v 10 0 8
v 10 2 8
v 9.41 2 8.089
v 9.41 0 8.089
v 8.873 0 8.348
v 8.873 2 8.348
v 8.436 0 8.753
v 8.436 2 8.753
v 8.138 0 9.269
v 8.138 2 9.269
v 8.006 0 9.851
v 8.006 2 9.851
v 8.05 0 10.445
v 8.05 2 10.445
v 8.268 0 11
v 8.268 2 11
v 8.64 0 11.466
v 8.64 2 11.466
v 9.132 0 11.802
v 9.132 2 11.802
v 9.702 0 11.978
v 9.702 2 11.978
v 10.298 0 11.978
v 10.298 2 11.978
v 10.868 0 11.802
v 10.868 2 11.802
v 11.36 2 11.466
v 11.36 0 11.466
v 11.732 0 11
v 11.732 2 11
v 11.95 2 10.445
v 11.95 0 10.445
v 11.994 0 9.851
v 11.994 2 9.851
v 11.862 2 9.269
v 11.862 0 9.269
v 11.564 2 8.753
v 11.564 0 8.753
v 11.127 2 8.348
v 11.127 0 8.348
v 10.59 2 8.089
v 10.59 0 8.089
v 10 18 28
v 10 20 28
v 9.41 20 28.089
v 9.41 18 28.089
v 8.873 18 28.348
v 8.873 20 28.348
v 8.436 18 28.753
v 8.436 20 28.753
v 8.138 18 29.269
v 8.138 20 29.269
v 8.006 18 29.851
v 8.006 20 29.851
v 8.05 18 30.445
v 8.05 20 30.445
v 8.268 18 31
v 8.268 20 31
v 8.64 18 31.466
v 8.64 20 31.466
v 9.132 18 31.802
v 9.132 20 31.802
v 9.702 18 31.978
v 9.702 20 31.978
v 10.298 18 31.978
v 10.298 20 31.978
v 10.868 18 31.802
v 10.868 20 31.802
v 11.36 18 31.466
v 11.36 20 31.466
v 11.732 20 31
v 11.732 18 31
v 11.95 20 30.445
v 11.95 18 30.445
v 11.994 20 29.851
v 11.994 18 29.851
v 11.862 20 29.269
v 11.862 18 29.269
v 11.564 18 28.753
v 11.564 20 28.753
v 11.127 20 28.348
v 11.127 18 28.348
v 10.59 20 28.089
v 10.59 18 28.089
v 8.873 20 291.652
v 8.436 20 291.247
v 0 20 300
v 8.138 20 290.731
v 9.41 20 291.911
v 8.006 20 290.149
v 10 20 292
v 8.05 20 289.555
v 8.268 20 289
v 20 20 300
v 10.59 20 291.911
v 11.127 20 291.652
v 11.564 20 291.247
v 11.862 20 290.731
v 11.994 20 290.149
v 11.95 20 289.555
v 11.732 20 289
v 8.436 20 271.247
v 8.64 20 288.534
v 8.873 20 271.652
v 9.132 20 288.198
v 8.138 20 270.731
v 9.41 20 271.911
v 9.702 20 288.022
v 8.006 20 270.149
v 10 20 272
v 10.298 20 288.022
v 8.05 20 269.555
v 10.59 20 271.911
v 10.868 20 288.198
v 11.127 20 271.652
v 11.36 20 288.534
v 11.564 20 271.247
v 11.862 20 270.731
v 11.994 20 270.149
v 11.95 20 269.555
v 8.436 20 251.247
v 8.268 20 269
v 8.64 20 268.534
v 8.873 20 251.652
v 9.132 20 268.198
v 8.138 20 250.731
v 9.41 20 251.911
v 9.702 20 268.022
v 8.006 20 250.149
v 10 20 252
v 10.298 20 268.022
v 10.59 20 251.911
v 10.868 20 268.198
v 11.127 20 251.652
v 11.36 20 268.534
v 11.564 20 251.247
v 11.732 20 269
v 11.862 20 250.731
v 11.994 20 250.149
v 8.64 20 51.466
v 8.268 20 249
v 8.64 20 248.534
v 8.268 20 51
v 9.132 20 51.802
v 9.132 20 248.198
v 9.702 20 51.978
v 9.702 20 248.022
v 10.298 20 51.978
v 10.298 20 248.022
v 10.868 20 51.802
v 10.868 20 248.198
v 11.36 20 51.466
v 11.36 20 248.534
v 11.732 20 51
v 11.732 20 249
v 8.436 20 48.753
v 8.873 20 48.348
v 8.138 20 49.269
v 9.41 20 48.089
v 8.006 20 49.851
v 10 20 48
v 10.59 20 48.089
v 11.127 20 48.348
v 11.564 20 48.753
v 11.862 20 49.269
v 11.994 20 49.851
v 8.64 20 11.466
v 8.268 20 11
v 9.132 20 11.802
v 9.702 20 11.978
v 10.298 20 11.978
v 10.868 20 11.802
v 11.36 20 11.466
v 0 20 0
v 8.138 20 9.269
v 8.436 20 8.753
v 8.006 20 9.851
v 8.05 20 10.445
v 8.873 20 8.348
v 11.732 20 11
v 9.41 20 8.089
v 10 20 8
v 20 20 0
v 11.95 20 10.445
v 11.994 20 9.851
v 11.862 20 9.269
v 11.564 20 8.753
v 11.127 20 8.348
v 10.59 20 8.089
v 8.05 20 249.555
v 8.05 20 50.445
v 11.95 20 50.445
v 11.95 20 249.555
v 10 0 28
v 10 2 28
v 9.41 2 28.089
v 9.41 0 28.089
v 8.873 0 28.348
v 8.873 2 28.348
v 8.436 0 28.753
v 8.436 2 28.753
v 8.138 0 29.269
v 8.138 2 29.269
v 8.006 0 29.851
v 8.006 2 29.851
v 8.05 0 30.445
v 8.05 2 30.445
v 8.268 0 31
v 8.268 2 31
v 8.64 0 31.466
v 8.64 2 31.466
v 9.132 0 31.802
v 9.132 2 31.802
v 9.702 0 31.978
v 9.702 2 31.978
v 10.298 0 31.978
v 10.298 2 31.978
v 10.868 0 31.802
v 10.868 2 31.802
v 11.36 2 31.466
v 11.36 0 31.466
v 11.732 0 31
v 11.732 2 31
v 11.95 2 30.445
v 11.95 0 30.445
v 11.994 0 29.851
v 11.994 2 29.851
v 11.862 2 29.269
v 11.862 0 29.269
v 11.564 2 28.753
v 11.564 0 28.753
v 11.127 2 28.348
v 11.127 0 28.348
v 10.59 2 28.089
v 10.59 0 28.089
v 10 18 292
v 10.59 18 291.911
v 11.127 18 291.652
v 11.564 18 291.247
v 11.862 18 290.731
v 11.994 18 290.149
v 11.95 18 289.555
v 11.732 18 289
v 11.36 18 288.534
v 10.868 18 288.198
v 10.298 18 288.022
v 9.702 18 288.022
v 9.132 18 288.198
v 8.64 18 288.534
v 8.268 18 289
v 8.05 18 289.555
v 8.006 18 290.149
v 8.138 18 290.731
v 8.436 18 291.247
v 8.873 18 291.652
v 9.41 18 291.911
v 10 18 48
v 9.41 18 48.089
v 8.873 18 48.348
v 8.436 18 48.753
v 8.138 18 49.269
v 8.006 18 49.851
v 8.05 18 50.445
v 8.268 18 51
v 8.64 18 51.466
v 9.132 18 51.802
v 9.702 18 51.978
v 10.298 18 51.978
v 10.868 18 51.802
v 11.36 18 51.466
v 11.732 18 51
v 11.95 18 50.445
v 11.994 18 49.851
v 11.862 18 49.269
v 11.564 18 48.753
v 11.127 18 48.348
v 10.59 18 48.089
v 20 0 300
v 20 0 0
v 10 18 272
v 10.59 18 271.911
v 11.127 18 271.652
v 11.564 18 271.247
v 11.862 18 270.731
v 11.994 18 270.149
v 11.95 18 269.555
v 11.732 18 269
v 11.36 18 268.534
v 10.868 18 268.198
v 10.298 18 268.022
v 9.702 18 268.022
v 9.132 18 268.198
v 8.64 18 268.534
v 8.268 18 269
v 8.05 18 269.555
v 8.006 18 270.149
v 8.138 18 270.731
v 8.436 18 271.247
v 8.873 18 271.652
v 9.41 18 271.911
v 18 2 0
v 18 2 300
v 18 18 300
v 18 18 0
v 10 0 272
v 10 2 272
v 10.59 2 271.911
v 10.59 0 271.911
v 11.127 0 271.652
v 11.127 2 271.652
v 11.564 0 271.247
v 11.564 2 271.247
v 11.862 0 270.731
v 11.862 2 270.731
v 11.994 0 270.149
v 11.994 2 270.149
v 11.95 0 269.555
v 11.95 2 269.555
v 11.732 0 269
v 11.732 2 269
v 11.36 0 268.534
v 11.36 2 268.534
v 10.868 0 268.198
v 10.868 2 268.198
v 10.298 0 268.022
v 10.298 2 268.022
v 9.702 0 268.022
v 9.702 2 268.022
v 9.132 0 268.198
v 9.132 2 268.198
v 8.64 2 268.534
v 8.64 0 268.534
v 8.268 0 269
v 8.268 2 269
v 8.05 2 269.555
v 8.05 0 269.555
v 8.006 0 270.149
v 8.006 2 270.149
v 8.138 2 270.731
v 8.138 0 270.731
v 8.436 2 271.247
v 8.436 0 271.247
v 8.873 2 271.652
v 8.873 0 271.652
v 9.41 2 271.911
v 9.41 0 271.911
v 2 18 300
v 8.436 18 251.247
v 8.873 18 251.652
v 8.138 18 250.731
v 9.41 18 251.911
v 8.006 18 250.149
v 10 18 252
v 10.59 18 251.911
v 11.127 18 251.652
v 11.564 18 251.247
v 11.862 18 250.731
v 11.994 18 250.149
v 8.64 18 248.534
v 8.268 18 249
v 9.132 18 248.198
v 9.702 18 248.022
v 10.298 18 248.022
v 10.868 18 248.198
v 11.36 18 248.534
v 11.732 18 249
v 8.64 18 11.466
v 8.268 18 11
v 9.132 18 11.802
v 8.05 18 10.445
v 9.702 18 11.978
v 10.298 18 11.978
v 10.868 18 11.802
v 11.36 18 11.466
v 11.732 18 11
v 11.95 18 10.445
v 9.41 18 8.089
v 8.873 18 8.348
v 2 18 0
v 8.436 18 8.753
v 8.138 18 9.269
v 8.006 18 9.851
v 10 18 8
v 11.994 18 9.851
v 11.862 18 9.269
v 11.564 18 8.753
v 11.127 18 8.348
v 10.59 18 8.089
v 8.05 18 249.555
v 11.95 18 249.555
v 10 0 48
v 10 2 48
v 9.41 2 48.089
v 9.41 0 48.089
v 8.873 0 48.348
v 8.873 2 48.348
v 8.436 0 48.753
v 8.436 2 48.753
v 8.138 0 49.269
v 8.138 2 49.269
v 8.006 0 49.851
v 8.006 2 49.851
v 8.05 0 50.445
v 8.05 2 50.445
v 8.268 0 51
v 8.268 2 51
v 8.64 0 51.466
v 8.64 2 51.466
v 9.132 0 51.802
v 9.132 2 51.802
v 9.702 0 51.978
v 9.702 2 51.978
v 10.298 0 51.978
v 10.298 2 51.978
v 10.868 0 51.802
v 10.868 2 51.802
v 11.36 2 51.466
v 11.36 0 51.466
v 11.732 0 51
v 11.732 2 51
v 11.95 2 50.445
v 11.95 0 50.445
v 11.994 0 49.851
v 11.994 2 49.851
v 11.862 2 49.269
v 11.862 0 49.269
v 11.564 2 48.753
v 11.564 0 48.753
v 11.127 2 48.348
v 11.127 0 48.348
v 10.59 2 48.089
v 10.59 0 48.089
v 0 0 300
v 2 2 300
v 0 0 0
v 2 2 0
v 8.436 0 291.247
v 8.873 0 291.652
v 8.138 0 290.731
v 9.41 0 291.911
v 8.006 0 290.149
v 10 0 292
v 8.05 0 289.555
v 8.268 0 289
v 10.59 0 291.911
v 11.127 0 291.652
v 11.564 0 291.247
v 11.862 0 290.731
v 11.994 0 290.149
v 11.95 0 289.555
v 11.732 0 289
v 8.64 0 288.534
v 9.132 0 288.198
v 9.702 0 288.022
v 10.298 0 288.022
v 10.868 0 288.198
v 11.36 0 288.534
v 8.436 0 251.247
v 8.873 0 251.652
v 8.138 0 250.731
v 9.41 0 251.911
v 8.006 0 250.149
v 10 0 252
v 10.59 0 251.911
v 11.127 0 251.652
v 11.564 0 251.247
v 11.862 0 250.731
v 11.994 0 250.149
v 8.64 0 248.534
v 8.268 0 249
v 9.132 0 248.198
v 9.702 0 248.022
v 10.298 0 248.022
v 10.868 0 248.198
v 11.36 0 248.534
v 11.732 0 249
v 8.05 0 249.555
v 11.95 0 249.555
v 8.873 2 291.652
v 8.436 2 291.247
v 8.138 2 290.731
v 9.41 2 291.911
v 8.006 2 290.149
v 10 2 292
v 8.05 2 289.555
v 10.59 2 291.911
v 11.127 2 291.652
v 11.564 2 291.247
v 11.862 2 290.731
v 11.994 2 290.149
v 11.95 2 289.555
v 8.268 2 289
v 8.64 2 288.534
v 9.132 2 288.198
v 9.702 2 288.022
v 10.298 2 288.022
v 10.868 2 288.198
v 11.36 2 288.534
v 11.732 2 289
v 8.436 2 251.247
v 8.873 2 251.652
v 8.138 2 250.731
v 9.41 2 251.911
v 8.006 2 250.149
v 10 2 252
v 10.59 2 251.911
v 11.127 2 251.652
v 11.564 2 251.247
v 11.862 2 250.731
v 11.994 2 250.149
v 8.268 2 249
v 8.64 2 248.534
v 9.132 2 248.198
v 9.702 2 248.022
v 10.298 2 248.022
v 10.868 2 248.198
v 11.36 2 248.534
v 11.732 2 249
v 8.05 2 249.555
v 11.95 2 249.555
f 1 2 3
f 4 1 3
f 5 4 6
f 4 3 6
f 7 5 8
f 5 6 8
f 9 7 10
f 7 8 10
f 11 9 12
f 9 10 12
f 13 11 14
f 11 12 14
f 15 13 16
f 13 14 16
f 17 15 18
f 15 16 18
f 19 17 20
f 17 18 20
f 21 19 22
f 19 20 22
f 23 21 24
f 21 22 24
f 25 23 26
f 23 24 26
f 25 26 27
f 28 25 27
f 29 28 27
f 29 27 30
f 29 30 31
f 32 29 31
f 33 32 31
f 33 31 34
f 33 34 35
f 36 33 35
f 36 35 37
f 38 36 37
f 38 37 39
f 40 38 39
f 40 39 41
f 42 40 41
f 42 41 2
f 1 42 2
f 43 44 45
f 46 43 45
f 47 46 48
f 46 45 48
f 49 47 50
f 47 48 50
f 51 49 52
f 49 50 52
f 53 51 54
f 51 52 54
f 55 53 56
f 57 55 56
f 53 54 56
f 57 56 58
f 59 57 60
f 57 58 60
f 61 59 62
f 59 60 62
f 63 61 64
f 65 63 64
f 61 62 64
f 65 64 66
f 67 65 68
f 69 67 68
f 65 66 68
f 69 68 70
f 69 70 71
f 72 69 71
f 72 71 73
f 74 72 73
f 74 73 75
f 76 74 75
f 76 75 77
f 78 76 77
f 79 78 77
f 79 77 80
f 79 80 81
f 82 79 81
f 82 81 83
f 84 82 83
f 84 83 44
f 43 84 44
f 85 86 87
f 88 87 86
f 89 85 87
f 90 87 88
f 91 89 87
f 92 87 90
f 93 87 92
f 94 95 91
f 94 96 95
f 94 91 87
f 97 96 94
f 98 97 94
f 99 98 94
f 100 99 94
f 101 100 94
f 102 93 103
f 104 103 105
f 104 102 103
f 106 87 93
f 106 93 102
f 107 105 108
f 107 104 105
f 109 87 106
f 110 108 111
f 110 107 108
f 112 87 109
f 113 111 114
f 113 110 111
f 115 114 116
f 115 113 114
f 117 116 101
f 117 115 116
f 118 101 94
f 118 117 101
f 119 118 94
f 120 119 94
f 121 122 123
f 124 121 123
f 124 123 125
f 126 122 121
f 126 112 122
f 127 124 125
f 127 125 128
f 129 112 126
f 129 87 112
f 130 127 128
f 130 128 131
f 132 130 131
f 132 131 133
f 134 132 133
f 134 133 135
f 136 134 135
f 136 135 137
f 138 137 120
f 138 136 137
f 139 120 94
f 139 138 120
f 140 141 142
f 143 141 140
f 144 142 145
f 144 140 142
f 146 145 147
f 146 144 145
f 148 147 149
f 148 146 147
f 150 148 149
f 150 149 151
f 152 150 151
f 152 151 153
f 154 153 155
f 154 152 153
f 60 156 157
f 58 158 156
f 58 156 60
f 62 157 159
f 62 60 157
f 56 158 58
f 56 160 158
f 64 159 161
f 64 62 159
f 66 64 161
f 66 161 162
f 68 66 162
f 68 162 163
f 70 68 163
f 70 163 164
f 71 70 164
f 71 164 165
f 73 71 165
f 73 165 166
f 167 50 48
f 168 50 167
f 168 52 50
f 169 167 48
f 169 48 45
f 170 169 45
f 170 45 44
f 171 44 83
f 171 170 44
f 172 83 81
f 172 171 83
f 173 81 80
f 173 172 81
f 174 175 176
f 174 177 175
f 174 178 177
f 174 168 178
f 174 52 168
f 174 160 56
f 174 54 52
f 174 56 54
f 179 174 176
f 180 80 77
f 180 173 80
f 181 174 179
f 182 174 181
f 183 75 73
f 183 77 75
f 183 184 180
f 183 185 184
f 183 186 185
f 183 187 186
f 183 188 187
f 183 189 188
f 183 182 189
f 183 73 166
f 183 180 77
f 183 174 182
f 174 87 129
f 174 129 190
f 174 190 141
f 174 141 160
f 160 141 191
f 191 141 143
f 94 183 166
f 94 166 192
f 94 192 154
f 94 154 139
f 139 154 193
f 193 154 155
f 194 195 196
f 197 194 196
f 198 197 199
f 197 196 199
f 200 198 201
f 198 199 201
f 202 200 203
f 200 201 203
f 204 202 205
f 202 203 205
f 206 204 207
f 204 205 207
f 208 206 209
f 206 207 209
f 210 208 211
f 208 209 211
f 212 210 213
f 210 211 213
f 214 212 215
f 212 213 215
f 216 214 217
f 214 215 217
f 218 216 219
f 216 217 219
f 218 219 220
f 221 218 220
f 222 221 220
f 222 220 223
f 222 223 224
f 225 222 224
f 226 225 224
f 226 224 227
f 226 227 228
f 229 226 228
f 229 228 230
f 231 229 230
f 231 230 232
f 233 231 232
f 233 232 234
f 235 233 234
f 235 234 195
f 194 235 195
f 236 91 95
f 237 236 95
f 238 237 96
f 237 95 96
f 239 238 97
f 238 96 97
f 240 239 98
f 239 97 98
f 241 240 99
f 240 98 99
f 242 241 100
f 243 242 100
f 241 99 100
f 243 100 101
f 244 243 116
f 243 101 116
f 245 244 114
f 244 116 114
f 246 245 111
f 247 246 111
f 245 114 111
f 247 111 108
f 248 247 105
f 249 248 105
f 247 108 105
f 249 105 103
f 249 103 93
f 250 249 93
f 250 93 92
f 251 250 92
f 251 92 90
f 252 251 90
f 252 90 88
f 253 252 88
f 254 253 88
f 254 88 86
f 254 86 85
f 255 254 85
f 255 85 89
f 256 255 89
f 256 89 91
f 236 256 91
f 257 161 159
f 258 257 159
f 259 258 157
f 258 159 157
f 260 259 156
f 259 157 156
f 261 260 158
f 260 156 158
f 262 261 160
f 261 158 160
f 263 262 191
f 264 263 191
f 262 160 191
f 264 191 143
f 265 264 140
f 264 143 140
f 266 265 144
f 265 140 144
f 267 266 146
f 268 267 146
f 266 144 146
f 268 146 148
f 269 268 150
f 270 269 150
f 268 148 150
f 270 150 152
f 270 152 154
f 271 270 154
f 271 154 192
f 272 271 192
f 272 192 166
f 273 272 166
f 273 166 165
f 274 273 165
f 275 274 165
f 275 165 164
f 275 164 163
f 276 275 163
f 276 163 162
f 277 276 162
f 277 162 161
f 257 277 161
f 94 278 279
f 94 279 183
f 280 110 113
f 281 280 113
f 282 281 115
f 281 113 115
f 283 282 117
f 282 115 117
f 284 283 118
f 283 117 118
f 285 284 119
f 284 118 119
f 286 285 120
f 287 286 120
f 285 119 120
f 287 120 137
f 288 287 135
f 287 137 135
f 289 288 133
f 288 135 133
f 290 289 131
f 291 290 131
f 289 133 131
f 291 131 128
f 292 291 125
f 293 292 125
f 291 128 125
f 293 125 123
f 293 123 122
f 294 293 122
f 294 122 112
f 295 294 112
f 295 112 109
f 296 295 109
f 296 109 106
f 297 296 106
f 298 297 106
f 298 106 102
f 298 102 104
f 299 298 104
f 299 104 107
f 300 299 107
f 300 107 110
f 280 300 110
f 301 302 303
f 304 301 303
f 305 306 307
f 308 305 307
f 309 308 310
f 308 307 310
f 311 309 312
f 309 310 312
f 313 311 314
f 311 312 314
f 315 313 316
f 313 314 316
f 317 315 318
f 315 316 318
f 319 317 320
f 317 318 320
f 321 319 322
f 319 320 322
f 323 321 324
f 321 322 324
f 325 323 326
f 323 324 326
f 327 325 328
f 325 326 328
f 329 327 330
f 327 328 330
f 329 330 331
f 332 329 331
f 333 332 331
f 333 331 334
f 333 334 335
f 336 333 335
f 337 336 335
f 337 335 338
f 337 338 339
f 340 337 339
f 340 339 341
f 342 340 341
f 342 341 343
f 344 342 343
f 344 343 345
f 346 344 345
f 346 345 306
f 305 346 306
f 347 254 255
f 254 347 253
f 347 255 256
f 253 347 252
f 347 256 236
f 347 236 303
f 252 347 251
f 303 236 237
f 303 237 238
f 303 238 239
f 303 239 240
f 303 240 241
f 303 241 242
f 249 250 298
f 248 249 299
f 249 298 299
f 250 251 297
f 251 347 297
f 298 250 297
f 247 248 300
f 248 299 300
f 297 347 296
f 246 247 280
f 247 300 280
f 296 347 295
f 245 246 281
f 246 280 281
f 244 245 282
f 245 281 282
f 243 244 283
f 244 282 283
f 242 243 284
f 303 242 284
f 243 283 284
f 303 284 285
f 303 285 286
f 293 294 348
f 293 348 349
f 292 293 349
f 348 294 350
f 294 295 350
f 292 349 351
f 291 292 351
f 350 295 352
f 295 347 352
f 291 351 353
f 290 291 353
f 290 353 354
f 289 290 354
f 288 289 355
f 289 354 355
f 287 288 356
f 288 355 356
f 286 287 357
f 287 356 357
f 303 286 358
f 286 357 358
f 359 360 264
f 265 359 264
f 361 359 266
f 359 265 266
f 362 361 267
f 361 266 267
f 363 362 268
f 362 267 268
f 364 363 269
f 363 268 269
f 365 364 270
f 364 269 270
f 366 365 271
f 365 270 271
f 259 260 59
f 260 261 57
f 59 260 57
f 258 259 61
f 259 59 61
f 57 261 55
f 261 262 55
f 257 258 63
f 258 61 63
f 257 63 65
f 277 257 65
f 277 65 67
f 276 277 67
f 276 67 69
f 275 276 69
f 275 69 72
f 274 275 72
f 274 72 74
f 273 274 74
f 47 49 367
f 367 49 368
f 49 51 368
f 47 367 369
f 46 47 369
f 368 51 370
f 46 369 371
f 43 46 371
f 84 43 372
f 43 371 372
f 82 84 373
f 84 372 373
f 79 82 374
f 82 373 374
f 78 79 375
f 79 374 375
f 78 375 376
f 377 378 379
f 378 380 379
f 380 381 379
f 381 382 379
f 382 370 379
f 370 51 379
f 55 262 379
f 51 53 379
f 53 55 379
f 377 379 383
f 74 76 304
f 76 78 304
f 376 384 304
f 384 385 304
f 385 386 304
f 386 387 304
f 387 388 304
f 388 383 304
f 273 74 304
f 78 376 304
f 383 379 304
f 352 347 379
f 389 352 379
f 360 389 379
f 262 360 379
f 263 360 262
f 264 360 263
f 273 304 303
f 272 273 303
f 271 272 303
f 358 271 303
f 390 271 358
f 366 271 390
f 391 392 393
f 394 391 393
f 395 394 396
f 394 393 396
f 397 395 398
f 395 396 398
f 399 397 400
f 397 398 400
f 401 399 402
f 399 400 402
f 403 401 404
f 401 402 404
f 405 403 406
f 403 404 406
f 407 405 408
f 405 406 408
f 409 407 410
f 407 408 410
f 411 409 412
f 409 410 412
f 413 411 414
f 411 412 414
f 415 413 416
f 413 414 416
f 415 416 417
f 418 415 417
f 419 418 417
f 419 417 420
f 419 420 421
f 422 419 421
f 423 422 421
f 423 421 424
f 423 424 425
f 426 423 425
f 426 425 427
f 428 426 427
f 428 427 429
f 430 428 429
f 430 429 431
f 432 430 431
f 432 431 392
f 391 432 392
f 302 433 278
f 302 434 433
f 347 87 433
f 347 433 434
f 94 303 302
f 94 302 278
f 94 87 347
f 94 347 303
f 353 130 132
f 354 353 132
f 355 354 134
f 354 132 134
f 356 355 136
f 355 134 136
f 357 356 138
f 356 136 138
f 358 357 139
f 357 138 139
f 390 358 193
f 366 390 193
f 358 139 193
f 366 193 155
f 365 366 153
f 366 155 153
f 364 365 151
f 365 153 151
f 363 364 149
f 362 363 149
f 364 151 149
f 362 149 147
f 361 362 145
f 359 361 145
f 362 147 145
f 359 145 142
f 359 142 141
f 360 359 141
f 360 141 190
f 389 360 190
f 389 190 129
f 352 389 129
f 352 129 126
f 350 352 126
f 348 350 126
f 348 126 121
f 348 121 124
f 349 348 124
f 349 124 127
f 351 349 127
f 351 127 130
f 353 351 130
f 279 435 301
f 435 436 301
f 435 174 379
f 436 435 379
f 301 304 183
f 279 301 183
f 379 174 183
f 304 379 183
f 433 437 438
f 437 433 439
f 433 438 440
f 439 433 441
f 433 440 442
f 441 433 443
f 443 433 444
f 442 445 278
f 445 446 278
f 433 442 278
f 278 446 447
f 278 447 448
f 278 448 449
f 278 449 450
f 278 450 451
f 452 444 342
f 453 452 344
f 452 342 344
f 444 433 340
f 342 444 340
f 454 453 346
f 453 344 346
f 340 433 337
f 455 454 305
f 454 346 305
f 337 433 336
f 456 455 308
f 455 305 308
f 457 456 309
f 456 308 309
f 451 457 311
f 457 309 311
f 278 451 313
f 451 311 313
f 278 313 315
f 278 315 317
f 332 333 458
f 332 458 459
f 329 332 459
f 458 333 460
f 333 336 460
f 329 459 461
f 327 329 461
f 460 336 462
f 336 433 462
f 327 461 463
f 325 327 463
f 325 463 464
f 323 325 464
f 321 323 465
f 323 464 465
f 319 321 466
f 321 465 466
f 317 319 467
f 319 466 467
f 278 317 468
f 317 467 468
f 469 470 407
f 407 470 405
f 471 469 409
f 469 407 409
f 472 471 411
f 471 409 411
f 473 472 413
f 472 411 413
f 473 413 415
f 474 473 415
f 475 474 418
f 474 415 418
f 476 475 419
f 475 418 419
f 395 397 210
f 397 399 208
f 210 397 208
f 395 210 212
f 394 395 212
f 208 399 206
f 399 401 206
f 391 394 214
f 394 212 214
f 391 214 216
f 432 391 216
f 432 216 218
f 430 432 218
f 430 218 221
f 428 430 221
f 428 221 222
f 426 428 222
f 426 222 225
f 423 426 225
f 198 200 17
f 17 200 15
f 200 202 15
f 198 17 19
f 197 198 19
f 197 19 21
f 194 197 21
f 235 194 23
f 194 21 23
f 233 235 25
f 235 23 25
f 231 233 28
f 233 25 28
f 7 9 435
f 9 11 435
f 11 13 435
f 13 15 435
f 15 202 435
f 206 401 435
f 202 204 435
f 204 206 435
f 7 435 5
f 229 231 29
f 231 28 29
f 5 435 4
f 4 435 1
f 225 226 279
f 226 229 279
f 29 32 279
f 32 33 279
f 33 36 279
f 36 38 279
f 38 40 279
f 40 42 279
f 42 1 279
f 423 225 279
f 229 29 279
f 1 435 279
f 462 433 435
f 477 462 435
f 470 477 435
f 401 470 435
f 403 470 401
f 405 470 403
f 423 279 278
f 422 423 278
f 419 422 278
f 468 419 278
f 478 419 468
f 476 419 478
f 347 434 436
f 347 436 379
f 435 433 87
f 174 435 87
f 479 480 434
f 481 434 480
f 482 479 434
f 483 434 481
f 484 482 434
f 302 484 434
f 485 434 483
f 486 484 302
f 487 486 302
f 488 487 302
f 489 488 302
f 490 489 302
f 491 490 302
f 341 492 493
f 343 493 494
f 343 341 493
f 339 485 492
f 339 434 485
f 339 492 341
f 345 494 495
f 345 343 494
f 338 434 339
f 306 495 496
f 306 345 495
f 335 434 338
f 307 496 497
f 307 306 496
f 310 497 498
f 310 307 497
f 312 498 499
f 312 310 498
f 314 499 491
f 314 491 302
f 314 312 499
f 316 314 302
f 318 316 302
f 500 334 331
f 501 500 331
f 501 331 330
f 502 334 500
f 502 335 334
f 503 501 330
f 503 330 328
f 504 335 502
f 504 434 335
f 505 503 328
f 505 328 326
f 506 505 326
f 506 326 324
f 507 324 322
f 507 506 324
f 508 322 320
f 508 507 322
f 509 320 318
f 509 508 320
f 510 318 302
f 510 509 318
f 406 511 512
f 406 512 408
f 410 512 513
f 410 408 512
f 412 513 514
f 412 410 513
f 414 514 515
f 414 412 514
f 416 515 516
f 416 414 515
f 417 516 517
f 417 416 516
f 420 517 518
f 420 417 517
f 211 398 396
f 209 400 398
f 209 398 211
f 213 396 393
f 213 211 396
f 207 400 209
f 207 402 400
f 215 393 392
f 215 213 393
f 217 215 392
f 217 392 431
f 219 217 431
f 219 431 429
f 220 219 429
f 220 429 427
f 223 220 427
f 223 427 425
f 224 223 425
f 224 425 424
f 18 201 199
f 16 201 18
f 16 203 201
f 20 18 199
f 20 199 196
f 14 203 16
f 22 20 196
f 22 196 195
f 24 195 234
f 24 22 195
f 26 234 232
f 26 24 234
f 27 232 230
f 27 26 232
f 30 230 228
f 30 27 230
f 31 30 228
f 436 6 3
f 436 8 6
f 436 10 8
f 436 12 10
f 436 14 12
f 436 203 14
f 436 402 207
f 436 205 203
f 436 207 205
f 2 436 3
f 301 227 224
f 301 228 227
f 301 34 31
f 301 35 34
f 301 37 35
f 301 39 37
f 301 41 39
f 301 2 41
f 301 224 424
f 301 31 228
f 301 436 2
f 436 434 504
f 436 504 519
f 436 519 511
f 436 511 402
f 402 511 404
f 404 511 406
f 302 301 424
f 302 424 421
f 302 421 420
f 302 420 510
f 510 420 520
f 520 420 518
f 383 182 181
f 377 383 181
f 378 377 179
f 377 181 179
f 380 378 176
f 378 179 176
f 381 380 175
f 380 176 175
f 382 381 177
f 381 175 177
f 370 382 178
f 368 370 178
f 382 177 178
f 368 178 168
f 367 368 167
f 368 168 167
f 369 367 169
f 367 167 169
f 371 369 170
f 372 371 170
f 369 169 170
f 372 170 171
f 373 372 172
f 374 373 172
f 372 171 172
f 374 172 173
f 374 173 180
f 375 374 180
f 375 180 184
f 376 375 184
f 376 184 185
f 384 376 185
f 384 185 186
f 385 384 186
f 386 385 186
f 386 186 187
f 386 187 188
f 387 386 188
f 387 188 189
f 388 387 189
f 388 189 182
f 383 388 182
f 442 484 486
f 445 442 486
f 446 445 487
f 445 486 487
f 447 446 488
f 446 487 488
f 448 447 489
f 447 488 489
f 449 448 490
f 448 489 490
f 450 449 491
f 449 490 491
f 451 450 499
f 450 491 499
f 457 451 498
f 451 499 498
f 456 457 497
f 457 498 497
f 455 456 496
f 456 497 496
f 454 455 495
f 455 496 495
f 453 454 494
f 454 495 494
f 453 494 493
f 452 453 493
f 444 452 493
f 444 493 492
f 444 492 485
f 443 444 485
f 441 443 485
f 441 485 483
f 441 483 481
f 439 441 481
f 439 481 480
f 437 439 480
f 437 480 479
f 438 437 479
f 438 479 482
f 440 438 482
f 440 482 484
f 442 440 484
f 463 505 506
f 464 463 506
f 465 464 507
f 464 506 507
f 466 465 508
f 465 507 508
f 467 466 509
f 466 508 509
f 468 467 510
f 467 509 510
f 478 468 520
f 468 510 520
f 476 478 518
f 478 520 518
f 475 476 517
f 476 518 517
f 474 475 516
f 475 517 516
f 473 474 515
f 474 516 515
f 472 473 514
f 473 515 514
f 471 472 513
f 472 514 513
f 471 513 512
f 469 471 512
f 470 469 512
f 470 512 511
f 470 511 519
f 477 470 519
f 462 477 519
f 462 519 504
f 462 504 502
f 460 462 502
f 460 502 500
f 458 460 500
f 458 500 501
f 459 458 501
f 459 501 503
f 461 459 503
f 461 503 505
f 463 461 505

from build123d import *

# Parameters (mm, degrees)
SKETCH_1_W          = 20
SKETCH_1_H          = 20
SKETCH_1_W_2        = 16
SKETCH_1_H_2        = 16
EXTRUDE_1_DEPTH     = 300
SKETCH_2_R          = 2
CUT_EXTRUDE_1_DEPTH = 302.330383466


with BuildPart() as part:
    # 草图1 → 拉伸-薄壁1 (new body)
    with BuildSketch(Plane.XY):
        with Locations((10, 10)):
            Rectangle(SKETCH_1_W, SKETCH_1_H)
        with Locations((10, 10)):
            Rectangle(SKETCH_1_W_2, SKETCH_1_H_2, mode=Mode.SUBTRACT)
    extrude(amount=EXTRUDE_1_DEPTH)

    # 草图2 → 切除-拉伸1 (cut, through all)
    with BuildSketch(Plane(origin=(0, 20, 0), x_dir=(1, 0, 0), z_dir=(0, 1, 0))):
        with Locations(Location((10, -290, 0), (0, 0, 270))):
            Circle(SKETCH_2_R)
        with Locations(Location((10, -270, 0), (0, 0, 270))):
            Circle(SKETCH_2_R)
        with Locations(Location((10, -250, 0), (0, 0, 270))):
            Circle(SKETCH_2_R)
        with Locations(Location((10, -10, 0), (0, 0, 90))):
            Circle(SKETCH_2_R)
        with Locations(Location((10, -30, 0), (0, 0, 90))):
            Circle(SKETCH_2_R)
        with Locations(Location((10, -50, 0), (0, 0, 90))):
            Circle(SKETCH_2_R)
    extrude(amount=-CUT_EXTRUDE_1_DEPTH, mode=Mode.SUBTRACT)


solid = part.part
